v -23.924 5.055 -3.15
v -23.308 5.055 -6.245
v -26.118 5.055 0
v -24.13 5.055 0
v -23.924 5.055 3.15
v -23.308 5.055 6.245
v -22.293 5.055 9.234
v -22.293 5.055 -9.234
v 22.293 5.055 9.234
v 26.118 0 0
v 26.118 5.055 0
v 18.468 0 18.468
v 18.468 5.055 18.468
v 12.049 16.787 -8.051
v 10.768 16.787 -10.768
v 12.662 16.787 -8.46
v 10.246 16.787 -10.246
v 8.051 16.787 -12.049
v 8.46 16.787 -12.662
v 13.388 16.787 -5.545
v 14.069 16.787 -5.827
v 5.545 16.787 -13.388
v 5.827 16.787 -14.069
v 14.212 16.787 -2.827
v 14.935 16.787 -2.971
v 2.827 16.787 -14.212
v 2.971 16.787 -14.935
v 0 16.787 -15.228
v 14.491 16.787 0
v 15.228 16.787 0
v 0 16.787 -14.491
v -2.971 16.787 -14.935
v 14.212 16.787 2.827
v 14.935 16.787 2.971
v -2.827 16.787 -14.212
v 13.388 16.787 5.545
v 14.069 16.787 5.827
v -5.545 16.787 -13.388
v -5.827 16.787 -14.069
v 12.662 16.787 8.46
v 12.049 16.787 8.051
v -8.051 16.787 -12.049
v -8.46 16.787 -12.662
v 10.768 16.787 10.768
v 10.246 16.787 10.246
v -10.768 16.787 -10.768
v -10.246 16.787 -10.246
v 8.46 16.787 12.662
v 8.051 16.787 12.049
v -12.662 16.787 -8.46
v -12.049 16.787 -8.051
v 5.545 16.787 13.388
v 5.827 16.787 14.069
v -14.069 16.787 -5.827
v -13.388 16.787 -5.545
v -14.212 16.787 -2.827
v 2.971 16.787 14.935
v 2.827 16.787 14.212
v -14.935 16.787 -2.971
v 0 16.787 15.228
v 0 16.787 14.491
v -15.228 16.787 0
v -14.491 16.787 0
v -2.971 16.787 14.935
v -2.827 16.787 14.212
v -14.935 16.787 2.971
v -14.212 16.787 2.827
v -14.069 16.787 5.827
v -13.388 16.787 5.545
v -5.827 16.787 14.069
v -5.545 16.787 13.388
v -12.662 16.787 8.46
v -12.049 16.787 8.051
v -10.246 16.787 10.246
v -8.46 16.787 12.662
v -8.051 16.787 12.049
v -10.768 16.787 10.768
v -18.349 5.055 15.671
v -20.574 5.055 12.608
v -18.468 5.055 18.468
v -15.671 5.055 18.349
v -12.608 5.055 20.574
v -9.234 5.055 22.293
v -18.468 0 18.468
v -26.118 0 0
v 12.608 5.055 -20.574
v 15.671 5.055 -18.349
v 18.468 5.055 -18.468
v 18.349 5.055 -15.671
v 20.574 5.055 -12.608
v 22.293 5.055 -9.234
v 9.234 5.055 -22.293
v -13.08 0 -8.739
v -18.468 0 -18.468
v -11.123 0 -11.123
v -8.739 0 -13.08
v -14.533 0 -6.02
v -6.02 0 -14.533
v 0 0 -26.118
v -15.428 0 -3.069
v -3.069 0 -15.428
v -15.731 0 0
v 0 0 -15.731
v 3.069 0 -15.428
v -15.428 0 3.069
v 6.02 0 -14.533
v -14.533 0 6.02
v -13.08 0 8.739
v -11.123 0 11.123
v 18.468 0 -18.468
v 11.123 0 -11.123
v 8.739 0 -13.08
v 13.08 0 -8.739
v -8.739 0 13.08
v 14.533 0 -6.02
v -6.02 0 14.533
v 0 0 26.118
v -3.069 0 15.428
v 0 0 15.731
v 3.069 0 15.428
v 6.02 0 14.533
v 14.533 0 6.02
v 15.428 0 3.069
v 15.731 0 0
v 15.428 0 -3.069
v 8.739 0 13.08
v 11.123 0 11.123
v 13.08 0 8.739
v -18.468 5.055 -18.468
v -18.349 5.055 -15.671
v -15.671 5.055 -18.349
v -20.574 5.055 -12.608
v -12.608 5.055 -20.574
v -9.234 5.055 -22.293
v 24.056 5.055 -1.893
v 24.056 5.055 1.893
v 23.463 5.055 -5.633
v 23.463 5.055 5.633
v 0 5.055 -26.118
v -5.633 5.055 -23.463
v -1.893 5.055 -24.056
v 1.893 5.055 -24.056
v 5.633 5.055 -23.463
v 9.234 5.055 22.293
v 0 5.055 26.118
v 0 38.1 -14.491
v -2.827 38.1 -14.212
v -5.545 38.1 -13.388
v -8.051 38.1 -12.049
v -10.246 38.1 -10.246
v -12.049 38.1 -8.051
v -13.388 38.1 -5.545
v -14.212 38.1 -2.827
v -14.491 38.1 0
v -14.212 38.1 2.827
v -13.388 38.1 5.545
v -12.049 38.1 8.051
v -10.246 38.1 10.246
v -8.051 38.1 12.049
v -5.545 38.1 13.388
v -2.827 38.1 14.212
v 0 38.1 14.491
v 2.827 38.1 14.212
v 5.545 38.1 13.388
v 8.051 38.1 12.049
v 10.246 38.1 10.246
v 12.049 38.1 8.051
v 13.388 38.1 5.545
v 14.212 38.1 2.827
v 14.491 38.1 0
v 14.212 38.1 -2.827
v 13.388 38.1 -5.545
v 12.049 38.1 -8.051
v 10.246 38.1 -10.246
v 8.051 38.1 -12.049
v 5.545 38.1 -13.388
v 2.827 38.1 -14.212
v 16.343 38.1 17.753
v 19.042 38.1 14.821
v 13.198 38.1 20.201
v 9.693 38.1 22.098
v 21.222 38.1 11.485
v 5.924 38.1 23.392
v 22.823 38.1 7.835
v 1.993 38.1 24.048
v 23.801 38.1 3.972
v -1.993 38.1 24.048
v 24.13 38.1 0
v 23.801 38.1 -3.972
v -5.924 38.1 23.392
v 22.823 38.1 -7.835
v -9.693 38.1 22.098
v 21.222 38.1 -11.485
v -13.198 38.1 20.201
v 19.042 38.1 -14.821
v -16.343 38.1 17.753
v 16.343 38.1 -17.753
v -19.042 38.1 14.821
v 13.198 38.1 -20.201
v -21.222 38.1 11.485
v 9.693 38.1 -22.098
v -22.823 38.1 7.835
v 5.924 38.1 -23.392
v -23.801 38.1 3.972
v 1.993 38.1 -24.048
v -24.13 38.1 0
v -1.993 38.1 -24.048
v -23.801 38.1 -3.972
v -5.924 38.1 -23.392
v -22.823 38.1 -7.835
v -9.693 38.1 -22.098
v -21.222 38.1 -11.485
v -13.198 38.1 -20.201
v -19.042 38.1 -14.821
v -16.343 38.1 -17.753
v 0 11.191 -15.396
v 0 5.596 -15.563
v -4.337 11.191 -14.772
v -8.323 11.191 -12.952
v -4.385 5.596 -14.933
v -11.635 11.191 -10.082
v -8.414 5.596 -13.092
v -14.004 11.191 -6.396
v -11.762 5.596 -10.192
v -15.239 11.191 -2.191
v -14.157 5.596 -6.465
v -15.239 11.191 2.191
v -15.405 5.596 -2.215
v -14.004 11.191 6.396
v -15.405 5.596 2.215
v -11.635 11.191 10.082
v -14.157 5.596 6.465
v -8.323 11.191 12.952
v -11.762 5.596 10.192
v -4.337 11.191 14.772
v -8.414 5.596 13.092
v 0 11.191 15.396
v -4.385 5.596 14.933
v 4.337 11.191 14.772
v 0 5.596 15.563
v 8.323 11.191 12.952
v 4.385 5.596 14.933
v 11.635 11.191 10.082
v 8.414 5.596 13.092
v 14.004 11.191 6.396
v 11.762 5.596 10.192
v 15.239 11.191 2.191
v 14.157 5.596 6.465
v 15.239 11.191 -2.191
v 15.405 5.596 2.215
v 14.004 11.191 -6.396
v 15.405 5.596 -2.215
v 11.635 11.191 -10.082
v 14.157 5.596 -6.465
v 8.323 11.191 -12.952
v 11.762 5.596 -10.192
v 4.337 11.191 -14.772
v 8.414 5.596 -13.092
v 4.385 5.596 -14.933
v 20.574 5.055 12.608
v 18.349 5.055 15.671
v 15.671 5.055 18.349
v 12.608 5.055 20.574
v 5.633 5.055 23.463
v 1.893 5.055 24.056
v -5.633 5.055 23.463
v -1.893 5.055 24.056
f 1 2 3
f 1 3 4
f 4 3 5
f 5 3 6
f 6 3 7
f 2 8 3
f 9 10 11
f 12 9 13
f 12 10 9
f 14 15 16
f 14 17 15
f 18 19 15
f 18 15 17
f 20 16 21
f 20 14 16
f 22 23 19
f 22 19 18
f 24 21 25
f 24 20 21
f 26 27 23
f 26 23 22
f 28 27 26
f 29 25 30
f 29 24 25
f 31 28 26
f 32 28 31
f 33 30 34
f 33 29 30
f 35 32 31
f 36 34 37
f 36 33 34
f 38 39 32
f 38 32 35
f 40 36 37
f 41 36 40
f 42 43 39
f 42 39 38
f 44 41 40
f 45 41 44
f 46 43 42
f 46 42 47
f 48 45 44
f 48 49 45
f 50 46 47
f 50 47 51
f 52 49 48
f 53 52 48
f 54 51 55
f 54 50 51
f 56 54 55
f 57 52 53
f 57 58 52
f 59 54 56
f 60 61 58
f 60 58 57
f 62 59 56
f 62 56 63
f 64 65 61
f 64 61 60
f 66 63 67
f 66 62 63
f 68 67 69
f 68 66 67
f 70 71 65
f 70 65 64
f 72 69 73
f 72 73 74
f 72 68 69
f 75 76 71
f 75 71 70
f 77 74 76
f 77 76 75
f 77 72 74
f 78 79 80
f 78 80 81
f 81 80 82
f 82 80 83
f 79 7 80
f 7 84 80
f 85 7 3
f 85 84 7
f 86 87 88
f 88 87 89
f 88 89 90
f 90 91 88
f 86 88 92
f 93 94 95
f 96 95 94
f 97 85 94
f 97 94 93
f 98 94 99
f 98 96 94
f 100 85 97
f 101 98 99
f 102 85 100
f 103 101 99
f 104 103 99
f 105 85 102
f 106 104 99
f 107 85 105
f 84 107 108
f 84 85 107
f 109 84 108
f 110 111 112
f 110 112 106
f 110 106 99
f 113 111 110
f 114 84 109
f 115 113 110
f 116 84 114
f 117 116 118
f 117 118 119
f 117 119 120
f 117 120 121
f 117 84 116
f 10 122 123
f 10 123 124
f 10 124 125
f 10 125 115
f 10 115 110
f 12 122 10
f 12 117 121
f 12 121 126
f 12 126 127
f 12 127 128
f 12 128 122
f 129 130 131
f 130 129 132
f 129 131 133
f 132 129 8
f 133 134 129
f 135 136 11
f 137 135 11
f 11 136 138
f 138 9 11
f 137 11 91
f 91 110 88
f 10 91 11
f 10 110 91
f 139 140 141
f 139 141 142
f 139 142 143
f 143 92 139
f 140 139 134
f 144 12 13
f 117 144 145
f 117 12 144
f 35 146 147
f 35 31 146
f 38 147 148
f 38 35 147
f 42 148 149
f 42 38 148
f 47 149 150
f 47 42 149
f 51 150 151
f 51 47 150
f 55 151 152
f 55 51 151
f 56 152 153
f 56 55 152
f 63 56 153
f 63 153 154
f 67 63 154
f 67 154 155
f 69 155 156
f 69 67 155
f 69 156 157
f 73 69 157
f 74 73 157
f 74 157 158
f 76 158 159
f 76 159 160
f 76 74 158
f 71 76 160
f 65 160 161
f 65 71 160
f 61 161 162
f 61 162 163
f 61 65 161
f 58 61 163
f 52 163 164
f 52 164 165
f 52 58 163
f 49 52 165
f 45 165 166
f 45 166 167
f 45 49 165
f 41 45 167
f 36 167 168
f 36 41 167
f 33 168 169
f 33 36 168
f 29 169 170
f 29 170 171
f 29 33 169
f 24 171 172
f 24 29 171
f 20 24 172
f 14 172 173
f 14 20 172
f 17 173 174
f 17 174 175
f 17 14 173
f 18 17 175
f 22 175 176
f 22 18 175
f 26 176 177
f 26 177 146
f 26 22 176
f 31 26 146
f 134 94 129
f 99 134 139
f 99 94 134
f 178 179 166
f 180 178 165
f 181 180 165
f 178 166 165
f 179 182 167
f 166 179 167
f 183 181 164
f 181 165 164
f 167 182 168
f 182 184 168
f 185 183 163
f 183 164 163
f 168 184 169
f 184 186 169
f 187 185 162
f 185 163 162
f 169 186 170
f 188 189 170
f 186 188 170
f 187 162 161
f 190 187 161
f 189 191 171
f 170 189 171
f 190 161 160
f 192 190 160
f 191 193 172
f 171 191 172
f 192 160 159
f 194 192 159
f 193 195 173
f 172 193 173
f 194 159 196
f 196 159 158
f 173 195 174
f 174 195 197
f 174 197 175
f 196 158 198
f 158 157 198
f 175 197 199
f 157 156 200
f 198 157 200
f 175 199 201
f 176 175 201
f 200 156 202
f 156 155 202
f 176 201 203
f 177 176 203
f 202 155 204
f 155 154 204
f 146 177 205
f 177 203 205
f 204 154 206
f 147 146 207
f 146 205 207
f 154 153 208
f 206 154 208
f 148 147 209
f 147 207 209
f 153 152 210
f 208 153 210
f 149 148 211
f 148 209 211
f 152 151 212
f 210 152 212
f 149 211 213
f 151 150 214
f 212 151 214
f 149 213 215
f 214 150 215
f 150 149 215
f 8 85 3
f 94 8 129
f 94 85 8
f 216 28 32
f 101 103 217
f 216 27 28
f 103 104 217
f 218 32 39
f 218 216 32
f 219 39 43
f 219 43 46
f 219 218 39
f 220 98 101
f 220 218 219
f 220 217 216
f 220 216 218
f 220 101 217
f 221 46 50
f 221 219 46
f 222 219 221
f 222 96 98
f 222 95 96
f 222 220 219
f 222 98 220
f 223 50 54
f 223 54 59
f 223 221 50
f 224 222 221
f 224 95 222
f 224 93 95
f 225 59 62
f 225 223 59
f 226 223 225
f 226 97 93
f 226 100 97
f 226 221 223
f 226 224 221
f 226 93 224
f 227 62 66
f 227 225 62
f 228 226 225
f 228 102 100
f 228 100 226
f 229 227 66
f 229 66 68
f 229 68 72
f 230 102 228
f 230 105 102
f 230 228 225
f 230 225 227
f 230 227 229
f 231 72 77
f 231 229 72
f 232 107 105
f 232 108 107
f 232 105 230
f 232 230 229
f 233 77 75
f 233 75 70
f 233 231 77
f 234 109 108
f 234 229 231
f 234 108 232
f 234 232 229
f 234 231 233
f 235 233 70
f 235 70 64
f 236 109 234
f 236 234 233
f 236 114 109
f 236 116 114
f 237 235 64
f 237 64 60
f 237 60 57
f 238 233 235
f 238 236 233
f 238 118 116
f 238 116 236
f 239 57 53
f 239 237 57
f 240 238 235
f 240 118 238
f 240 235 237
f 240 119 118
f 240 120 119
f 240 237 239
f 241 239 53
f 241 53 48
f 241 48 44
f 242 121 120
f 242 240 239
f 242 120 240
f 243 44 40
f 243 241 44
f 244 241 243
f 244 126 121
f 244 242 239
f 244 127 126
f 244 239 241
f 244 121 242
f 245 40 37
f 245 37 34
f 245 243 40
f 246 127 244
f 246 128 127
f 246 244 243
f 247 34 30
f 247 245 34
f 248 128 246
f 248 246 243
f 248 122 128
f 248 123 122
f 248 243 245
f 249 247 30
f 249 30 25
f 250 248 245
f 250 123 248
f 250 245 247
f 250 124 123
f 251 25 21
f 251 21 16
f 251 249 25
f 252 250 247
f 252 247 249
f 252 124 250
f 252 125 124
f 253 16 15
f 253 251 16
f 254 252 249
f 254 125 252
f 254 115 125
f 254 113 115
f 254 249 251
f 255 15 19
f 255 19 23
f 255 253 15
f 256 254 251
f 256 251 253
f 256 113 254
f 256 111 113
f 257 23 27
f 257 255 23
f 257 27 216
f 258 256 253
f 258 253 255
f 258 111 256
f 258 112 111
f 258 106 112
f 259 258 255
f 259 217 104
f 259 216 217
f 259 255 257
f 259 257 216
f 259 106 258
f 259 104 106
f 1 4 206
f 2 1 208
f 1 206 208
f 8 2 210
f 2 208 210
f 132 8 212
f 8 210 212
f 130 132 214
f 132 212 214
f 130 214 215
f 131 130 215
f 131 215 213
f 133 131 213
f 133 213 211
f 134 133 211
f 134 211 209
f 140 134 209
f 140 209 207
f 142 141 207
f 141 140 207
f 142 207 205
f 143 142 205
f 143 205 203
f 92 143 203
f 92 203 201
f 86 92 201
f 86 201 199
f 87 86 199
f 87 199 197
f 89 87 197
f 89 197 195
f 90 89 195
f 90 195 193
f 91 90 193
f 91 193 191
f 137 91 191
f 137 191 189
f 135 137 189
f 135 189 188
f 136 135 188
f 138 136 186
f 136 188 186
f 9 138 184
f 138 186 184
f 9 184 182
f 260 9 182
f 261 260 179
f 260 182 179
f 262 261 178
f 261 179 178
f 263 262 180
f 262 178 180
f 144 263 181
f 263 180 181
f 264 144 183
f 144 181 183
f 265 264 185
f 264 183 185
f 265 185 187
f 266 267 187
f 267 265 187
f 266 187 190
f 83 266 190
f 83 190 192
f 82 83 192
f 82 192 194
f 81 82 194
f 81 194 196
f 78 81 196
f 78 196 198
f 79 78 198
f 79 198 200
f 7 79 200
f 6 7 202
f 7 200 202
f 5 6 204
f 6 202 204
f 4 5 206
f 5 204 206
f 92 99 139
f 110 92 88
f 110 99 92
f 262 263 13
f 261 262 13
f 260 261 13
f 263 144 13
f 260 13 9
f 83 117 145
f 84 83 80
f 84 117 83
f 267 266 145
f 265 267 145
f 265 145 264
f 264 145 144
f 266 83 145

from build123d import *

# Parameters (mm, degrees)
SKETCH1_W           = 17.78
SKETCH1_H           = 38.1
SKETCH2_R           = 6.35
BOSS_EXTRUDE1_DEPTH = 5.0546


with BuildPart() as part:
    # Sketch1 → Revolve1 (revolve)
    with BuildSketch(Plane.XY):
        with Locations((-15.24, 19.05)):
            Rectangle(SKETCH1_W, SKETCH1_H)
    revolve(axis=Axis((0, 0, 0), (0, -1, 0)))

    # Sketch2 → Boss-Extrude1 (add)
    with BuildSketch(Plane.XZ):
        Polygon((0, 26.118123793), (-18.468302446, 18.468302446), (-26.118123793, 0), (-18.468302446, -18.468302446), (0, -26.118123793), (18.468302446, -18.468302446), (26.118123793, 0), (18.468302446, 18.468302446), align=None)
        Circle(SKETCH2_R, mode=Mode.SUBTRACT)
    extrude(amount=-BOSS_EXTRUDE1_DEPTH)

    # Sketch4 → 1 NPT Tapped Hole1 (revolve, cut)
    with BuildSketch(Plane(origin=(0, 0, 0), x_dir=(0, 0, -1), z_dir=(1, 0, 0))):
        Polygon((0, 0), (0, 38.1), (14.4907, 38.1), (14.4907, 16.78686), (15.227979931, 16.78686), (15.730601, 0), align=None)
    revolve(axis=Axis((0, -6.35, 0), (0, 1, 0)), mode=Mode.SUBTRACT)


solid = part.part
